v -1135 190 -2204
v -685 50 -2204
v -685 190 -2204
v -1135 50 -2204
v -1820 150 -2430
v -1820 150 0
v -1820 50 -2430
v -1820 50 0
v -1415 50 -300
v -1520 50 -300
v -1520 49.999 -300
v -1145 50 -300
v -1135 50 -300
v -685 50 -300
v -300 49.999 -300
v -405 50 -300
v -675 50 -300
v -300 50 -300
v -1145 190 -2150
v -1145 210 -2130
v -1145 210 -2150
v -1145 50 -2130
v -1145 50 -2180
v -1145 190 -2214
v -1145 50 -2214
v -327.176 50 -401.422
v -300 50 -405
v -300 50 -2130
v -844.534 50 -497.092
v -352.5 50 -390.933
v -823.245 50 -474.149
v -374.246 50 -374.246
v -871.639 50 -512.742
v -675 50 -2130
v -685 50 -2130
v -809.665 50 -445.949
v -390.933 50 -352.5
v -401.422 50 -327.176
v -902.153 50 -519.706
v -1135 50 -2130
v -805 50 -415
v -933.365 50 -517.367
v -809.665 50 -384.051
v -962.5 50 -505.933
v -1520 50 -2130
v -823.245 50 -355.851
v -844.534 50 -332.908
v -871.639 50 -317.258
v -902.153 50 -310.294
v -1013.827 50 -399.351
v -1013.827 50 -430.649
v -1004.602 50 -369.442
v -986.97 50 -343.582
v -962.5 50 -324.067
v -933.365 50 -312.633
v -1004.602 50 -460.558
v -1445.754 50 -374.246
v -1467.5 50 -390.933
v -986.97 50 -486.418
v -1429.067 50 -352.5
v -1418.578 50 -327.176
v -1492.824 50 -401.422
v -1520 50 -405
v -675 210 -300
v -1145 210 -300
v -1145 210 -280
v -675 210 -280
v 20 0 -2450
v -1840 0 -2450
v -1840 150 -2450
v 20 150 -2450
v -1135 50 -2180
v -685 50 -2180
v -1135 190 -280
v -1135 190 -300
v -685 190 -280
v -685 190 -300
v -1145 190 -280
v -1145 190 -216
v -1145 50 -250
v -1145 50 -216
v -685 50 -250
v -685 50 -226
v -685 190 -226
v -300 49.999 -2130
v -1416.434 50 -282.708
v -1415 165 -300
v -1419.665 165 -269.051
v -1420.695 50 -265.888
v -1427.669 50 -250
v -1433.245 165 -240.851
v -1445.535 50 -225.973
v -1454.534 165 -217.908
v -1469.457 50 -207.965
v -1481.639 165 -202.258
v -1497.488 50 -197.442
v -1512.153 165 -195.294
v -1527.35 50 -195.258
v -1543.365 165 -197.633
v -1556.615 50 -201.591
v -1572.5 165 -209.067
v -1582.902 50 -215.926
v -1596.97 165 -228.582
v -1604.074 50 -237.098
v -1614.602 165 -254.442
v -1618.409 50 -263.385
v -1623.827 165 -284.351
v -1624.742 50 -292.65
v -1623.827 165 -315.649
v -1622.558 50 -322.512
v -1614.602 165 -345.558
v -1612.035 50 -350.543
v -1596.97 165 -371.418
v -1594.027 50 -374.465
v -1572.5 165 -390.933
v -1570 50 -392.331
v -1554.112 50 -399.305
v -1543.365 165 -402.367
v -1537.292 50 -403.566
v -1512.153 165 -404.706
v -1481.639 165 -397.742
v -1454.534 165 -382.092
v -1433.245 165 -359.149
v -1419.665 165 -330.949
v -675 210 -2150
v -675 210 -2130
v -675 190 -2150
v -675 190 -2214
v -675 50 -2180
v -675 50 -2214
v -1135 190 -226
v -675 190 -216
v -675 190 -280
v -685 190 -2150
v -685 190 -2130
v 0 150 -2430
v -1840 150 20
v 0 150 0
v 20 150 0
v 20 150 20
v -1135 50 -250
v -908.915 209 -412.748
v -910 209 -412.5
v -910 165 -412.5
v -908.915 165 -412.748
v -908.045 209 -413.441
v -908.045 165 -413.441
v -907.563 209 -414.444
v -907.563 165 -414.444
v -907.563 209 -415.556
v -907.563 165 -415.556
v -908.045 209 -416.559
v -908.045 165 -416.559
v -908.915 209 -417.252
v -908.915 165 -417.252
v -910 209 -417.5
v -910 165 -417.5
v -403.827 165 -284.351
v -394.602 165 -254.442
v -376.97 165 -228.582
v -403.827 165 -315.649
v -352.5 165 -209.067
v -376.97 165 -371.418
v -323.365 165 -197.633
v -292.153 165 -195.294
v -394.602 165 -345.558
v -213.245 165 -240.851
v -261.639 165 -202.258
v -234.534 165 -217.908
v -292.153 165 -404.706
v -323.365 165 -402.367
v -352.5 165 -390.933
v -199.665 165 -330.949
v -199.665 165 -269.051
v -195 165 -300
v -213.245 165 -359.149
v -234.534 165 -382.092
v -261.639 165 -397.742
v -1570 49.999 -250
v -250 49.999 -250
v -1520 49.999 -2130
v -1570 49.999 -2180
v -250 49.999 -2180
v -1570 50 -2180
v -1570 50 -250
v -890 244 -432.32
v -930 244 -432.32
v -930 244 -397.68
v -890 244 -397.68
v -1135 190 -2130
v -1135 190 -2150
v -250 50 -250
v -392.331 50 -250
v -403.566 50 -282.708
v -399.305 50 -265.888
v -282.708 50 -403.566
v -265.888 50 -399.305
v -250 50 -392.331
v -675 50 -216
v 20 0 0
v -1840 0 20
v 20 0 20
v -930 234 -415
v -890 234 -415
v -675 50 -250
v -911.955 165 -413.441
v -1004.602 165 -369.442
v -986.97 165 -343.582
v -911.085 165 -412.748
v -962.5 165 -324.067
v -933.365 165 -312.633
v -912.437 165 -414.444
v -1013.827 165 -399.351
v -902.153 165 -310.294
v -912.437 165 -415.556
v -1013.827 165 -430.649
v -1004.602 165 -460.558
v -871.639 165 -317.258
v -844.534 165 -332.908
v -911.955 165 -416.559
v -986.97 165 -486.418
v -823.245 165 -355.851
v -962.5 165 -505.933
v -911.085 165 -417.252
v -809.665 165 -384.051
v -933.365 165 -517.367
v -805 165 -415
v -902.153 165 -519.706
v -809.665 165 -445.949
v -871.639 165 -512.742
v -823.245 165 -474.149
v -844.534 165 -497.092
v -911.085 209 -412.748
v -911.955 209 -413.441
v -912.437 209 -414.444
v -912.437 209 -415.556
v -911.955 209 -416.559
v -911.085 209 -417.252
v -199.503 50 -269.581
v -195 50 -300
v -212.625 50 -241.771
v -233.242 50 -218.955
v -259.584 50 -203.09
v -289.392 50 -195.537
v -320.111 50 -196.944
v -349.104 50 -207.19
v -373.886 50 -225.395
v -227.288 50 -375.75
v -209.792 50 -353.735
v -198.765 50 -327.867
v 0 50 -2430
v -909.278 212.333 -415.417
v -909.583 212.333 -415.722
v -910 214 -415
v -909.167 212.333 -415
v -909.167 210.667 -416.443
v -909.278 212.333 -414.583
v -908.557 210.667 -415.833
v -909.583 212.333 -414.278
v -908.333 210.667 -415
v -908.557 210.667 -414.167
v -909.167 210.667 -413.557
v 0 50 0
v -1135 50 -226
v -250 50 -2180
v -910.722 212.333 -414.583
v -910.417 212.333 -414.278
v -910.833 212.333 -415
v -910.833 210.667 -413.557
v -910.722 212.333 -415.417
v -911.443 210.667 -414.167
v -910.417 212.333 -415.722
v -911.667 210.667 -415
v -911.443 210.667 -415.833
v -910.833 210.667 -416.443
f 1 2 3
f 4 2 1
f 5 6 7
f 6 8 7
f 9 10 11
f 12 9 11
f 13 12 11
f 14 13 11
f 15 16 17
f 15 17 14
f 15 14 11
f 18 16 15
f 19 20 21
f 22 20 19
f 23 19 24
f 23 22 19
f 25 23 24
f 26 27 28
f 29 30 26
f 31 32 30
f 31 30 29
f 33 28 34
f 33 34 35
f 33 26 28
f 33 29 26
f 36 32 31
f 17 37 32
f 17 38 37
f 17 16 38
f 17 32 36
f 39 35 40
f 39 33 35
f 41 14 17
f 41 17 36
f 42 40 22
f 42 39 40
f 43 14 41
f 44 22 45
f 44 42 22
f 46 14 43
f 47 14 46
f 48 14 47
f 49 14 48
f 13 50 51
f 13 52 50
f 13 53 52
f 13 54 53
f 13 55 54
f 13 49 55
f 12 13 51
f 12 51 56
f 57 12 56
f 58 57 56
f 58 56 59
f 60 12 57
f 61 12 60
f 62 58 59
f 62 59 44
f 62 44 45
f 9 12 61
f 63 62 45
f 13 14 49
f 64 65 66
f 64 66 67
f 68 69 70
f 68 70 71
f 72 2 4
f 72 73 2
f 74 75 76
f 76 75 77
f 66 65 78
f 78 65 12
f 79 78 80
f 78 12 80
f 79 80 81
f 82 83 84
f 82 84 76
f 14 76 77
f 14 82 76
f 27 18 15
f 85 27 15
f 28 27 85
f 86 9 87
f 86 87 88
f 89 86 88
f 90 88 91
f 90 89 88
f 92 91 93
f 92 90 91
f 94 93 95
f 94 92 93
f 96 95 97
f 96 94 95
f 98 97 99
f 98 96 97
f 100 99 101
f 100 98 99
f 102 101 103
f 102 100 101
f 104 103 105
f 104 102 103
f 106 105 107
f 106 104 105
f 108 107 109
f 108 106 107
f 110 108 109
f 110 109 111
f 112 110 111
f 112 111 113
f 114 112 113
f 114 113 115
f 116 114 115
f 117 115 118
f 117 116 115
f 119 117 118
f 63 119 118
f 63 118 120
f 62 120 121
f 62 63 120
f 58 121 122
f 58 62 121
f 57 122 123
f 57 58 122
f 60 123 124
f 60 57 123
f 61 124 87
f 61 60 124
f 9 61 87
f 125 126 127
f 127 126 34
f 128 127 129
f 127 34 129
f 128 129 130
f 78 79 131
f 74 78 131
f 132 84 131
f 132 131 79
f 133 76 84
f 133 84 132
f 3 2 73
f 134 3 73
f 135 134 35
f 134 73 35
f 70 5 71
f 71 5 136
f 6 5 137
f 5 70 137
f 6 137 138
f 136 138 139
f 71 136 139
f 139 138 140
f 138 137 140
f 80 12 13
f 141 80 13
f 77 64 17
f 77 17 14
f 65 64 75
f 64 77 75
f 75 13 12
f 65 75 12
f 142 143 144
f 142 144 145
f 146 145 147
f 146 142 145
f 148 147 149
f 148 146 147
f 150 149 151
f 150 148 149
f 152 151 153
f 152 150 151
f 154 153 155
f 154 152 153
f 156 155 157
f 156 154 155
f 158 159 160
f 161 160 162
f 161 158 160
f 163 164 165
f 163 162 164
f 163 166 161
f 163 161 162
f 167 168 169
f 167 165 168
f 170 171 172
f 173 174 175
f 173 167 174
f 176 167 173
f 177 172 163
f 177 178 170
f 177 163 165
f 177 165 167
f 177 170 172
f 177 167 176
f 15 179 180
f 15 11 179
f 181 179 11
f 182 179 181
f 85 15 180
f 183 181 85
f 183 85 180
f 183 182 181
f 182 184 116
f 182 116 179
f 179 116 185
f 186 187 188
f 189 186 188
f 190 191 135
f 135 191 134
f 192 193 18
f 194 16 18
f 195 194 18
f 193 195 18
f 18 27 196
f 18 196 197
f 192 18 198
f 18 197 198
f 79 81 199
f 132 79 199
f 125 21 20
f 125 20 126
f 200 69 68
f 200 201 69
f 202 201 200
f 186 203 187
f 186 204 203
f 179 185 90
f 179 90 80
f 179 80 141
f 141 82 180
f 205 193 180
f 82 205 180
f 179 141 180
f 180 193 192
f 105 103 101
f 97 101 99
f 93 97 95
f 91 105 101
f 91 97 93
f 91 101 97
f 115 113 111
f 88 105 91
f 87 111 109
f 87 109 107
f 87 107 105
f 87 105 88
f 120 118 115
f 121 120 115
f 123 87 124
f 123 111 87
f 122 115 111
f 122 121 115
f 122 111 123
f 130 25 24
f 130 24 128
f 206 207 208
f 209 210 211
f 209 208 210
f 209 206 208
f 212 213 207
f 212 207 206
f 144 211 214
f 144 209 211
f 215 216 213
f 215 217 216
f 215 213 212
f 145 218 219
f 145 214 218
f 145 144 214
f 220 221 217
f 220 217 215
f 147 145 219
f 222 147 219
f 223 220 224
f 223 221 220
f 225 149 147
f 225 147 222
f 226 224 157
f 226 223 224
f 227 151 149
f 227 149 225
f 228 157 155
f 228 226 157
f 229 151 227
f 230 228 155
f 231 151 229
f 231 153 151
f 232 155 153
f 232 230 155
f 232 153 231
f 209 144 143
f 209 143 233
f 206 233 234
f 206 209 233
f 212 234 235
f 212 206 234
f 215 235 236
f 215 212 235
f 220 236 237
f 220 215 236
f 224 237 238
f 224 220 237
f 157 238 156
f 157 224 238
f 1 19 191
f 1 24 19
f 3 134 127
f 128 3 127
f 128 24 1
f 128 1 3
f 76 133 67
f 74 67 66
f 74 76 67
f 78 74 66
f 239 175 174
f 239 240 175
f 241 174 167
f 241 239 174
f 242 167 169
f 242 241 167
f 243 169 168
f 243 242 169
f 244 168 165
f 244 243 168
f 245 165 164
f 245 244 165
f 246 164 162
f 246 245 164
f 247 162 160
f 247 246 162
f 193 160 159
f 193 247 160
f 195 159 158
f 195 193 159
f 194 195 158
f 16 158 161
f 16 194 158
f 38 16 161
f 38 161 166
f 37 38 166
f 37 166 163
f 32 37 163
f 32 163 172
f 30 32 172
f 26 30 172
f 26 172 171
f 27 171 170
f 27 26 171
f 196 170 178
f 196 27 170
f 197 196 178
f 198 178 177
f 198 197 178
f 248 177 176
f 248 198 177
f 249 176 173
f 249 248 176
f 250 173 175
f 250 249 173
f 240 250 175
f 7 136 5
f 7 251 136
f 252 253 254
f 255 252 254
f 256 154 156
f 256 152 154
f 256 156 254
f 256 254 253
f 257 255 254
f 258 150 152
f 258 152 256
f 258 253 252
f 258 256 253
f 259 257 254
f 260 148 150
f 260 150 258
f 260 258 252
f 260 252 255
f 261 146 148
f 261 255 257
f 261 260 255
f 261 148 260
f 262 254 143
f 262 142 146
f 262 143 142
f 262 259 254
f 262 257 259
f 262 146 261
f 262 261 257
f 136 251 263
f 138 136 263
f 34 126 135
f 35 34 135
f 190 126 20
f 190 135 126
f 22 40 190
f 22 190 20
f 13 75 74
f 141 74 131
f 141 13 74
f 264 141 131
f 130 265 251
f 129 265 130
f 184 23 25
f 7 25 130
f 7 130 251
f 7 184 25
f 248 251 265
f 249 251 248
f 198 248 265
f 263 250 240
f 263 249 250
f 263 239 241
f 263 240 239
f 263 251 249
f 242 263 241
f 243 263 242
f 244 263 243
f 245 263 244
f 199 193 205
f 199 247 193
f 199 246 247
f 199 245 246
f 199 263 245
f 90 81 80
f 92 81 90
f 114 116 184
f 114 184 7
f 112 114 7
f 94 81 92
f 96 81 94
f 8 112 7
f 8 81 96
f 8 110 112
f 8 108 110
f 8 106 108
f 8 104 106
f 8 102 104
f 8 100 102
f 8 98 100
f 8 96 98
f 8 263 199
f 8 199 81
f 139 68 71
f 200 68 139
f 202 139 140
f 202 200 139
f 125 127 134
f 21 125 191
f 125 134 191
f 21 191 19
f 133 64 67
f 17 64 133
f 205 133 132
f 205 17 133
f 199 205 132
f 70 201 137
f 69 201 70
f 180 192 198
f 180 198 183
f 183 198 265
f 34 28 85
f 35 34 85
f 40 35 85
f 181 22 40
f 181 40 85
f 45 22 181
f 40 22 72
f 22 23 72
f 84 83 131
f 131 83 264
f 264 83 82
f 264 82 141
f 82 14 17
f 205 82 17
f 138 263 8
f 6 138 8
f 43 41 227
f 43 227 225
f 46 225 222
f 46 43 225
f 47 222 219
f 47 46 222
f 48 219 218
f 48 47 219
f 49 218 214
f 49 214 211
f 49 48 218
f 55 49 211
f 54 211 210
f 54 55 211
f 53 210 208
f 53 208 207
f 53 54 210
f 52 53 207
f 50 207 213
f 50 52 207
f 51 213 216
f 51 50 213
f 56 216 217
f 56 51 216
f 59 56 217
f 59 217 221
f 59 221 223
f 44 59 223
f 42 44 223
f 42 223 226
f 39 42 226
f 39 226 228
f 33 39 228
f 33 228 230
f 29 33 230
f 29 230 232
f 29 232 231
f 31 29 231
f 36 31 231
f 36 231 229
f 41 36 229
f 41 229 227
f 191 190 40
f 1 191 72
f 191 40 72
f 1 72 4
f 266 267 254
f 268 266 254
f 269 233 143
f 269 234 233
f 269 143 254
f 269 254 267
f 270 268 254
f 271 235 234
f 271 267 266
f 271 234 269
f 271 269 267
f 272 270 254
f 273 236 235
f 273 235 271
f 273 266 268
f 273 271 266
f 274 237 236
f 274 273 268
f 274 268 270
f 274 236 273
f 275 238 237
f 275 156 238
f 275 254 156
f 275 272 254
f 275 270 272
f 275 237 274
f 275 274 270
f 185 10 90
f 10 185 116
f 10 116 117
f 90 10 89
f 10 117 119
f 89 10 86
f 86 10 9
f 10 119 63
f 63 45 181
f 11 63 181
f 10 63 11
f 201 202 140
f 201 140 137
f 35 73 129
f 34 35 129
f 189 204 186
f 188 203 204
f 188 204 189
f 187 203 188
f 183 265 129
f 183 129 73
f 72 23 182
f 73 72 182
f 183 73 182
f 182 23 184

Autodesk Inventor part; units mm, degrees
ref_plane "YZ Plane" through (0, 0, 0) normal (1, 0, 0) x (0, 1, 0)
ref_plane "XZ Plane" through (0, 0, 0) normal (0, 1, 0) x (-1, 0, 0)
ref_plane "XY Plane" through (0, 0, 0) normal (0, 0, 1) x (1, 0, 0)
sketch "Sketch1" plane through (0, 0, 0) normal (0, 1, 0) x (-1, 0, 0)
  line L0 (0, 0) -> (1820, 0)
  line L1 (1820, 0) -> (1820, -2430)
  line L2 (1820, -2430) -> (0, -2430)
  line L3 (0, -2430) -> (0, 0)
  dimension "d0" = 1820
  dimension "d1" = 2430
extrude "Extrusion1" add sketch "Sketch1" along normal blind 50
sketch "Sketch2" plane through (0, 50, 0) normal (0, 1, 0) x (1, 0, 0)
  line L0 (-1820, 2430) -> (-1820, 0) projected
  line L1 (-1820, 0) -> (-1820, 250)
  line L2 (-1820, 250) -> (-1570, 250)
  line L3 (-1820, 250) -> (-1570, 250) construction
  line L4 (0, 2430) -> (-1820, 2430) projected
  line L5 (0, 2430) -> (0, 2180)
  line L6 (0, 0) -> (0, 2430) projected
  line L7 (0, 2180) -> (-250, 2180)
  line L8 (-1570, 250) -> (-250, 250)
  line L9 (-250, 250) -> (-250, 2180)
  line L10 (-250, 2180) -> (-1570, 2180)
  line L11 (-1570, 2180) -> (-1570, 250)
  line L12 (-1570, 250) -> (-1570, 300)
  line L13 (-1570, 300) -> (-1520, 300)
  line L14 (-250, 2180) -> (-300, 2180)
  line L15 (-300, 2180) -> (-300, 2130)
  line L16 (-1520, 300) -> (-300, 300)
  line L17 (-300, 300) -> (-300, 2130)
  line L18 (-300, 2130) -> (-1520, 2130)
  line L19 (-1520, 2130) -> (-1520, 300)
  dimension "d4" = 250
  dimension "d5" = 250
  dimension "d6" = 0
  dimension "d7" = 250
  dimension "d8" = 250
  dimension "d9" = 50
  dimension "d10" = 50
  dimension "d11" = 50
  dimension "d12" = 50
extrude "Extrusion2" cut sketch "Sketch2" against normal blind 0.001 contours L11 L13 L16 L17 L15 L10 L9 L8 | L11 L10 L15 L18 L19 L13
sketch "Sketch3" plane through (0, 0, 0) normal (0, -1, 0) x (1, 0, 0)
  line L0 (0, -2430) -> (-1820, -2430) projected
  line L1 (0, 0) -> (-1820, 0)
  line L2 (-1820, 0) -> (-1820, -2430)
  line L3 (-1820, -2430) -> (0, -2430)
  line L4 (0, -2430) -> (0, 0)
  line L5 (0, 0) -> (20, 0)
  line L6 (20, 0) -> (20, 20)
  line L7 (20, 20) -> (-1840, 20)
  line L8 (-1840, 20) -> (-1840, -2450)
  line L9 (-1840, -2450) -> (20, -2450)
  line L10 (20, -2450) -> (20, 20)
  dimension "d15" = 20
  dimension "d16" = 20
  dimension "d17" = 1860
  dimension "d18" = 2470
extrude "Extrusion3" add sketch "Sketch3" against normal blind 150
sketch "Sketch4" plane through (0, 50, 0) normal (0, 1, 0) x (1, 0, 0)
  line L0 (-300, 300) -> (-300, 2130) projected
  line L1 (-300, 1215) -> (-910, 1215)
  line L2 (-300, 2130) -> (-1520, 2130) projected
  line L3 (-910, 1215) -> (-910, 2130)
  line L4 (-1570, 2180) -> (-250, 2180) projected
  line L5 (-910, 2130) -> (-1135, 2130)
  line L6 (-1135, 2130) -> (-1135, 2204)
  line L7 (-1135, 2130) -> (-1145, 2130)
  line L8 (-1145, 2130) -> (-1145, 2214)
  line L9 (-1145, 2214) -> (-1135, 2214)
  line L10 (-1135, 2214) -> (-1135, 2130)
  line L11 (-1135, 2214) -> (-675, 2214)
  line L12 (-675, 2214) -> (-675, 2204)
  line L13 (-675, 2204) -> (-1135, 2204)
  line L14 (-1135, 2204) -> (-1135, 2214)
  line L15 (-675, 2204) -> (-685, 2204)
  line L16 (-685, 2204) -> (-685, 2130)
  line L17 (-685, 2130) -> (-675, 2130)
  line L18 (-675, 2130) -> (-675, 2204)
  line L19 (-300, 300) -> (-1520, 300)
  line L20 (-1135, 300) -> (-1135, 226)
  line L21 (-1135, 300) -> (-1145, 300)
  line L22 (-1145, 300) -> (-1145, 216)
  line L23 (-1145, 216) -> (-1135, 216)
  line L24 (-1135, 216) -> (-675, 216)
  line L25 (-675, 216) -> (-675, 226)
  line L26 (-675, 226) -> (-1135, 226)
  line L27 (-685, 226) -> (-685, 300)
  line L28 (-685, 300) -> (-675, 300)
  line L29 (-675, 300) -> (-675, 226)
  line L30 (-1145, 216) -> (-675, 216)
  line L31 (-675, 216) -> (-675, 226)
  line L32 (-675, 226) -> (-1145, 226)
  line L33 (-1145, 226) -> (-1145, 216)
  line L34 (-675, 226) -> (-685, 226)
  line L35 (-685, 226) -> (-685, 300)
  line L36 (-685, 300) -> (-675, 300)
  line L37 (-675, 300) -> (-675, 226)
  line L38 (-1145, 226) -> (-1135, 226)
  line L39 (-1135, 226) -> (-1135, 300)
  line L40 (-1135, 300) -> (-1145, 300)
  line L41 (-1145, 300) -> (-1145, 226)
  point P0 (0, 0)
  dimension "d22" = 225
  dimension "d23" = 74
  dimension "d24" = 10
  dimension "d25" = 84
  dimension "d26" = 460
  dimension "d27" = 10
extrude "Extrusion4" add sketch "Sketch4" along normal blind 140 contours L29 L26 L27 L19 | L25 L24 L23 L22 L32 L26 | L2 L16 L4 L18 | L20 L32 L22 L19 | L4 L16 L13 L18 | L2 L8 L4 L6 | L13 L10 L11 L12 | L4 L8 L9 L10 L6
sketch "Sketch5" plane through (0, 190, 0) normal (0, 1, 0) x (1, 0, 0)
  line L0 (-1145, 300) -> (-1145, 250) projected
  line L1 (-675, 250) -> (-675, 300) projected
  line L2 (-1145, 300) -> (-675, 300)
  line L3 (-675, 300) -> (-675, 280)
  line L4 (-675, 280) -> (-1145, 280)
  line L5 (-1145, 280) -> (-1145, 300)
  line L6 (-300, 2130) -> (-1520, 2130) projected
  line L7 (-675, 2130) -> (-675, 2180) projected
  line L8 (-1145, 2130) -> (-675, 2130)
  line L9 (-675, 2130) -> (-675, 2150)
  line L10 (-675, 2150) -> (-1145, 2150)
  line L11 (-1145, 2150) -> (-1145, 2130)
  line L12 (-1145, 2180) -> (-1145, 2130) projected
  line L13 (-1145, 2130) -> (-675, 2130)
  line L14 (-675, 2130) -> (-675, 2130.001)
  line L15 (-675, 2130.001) -> (-1145, 2130.001)
  line L16 (-1145, 2130.001) -> (-1145, 2130)
  line L17 (-1135, 300) -> (-1145, 300) projected
  line L18 (-675, 216) -> (-675, 300) projected
  line L19 (-1145, 300) -> (-675, 300)
  line L20 (-675, 300) -> (-675, 299.999)
  line L21 (-675, 299.999) -> (-1145, 299.999)
  line L22 (-1145, 299.999) -> (-1145, 300)
  point P0 (0, 0)
  dimension "d30" = 20
  dimension "d31" = 20
  dimension "d34" = 0.001
  dimension "d35" = 0.001
extrude "Extrusion5" add sketch "Sketch5" along normal blind 20
sketch "Sketch6" plane through (0, 50, 0) normal (0, 1, 0) x (1, 0, 0)
  line L0 (-1520, 300) -> (-1145, 300) projected
  circle A0 centre (-1520, 300) radius 105
  line L1 (-1135, 300) -> (-685, 300) projected
  line L2 (-910, 300) -> (-910, 415)
  circle A1 centre (-910, 415) radius 105
  line L3 (-300, 300) -> (-300, 2130) projected
  circle A2 centre (-300, 300) radius 105
  point P0 (0, 0)
  dimension "d36" = 210
  dimension "d37" = 115
  dimension "d38" = 210
  dimension "d39" = 210
extrude "Extrusion6" add sketch "Sketch6" along normal blind 115
sketch "Sketch7" plane through (-1520, 165, -300) normal (0, 1, 0) x (1, 0, 0)
  circle A0 centre (610, 115) radius 105 projected
  line L0 (610, 115) -> (590, 115)
  line L1 (590, 115) -> (590, 136.6505)
  line L2 (590, 136.6505) -> (630, 136.6505)
  line L3 (630, 136.6505) -> (630, 93.3495)
  line L4 (630, 93.3495) -> (590, 93.3495)
  line L5 (590, 93.3495) -> (590, 115)
  point P0 (1520, -300)
  dimension "d42" = 20
  dimension "d43" = 21.6505
  dimension "d44" = 40
  dimension "d45" = 43.301
extrude "Extrusion7" add sketch "Sketch7" along normal blind 81.5 contours L1 L2 L3 L4 L5
sketch "Sketch8" plane through (-890, 165, -393.3495) normal (1, 0, 0) x (0, 0, -1)
  line L0 (43.301, 81.5) -> (0, 81.5) projected
  line L1 (21.6505, 81.5) -> (21.6505, 69)
  line L2 (21.6505, 69) -> (43.301, 81.5)
  line L3 (21.6505, 69) -> (0, 81.5)
  line L4 (0, 81.5) -> (0, 0)
  line L5 (126.6505, 0) -> (-83.3495, 0) projected
  line L6 (43.301, 0) -> (43.301, 81.5) projected
  line L7 (0, 0) -> (43.301, 0)
  line L8 (43.301, 0) -> (43.301, 81.5)
  point P0 (-393.3495, -165)
  dimension "d48" = 12.5
extrude "Extrusion8" cut sketch "Sketch8" against normal blind 40 contours L6 L5 L4 L3 L2
sketch "Sketch9" plane through (-910, 165, -415) normal (0, 1, 0) x (1, 0, 0)
  circle A0 centre (0, 0) radius 2.5
  point P0 (910, -415)
  dimension "d51" = 5
extrude "Extrusion9" add sketch "Sketch9" along normal blind 49
sketch "Sketch10" plane through (-910, 214, -415) normal (0, 1, 0) x (1, 0, 0)
  line L0 (20, 0) -> (-20, 0) projected
  line L1 (0, 0) -> (2.9883, 0)
  line L2 (2.9883, 0) -> (2.9883, -4.9362)
  line L3 (2.9883, -4.9362) -> (0, -4.9362)
  line L4 (0, -4.9362) -> (0, 0)
  line L5 (0, 0) -> (4.3041, 0)
  line L6 (4.3041, 0) -> (4.3041, 5.8291)
  line L7 (4.3041, 5.8291) -> (0, 5.8291)
  line L8 (0, 5.8291) -> (0, 0)
  point P0 (910, -415)
extrude "Extrusion10" cut sketch "Sketch10" against normal blind 49
sketch "Sketch11" plane through (-910, 214, -412.5) normal (1, 0, 0) x (0, 0, -1)
  line L0 (5, 0) -> (0, 0) projected
  line L1 (2.5, 0) -> (2.5, -5)
  line L2 (2.5, -5) -> (5, -5)
  line L3 (5, 0) -> (5, -49) projected
  line L4 (2.5, 0) -> (5, -5)
  line L5 (2.5, -5) -> (0, -5)
  line L6 (0, -49) -> (0, 0) projected
  line L7 (0, -5) -> (2.5, 0)
  line L8 (2.5, 0) -> (0, 0)
  line L9 (0, 0) -> (0, -5)
  line L10 (2.5, 0) -> (5, 0)
  line L11 (5, 0) -> (5, -5)
  point P0 (-412.5, -214)
  dimension "d56" = 5
extrude "Extrusion11" cut sketch "Sketch11" against normal blind 49 contours L3 L4 L0 | L7 L6 L0
sketch "Sketch12" plane through (-910, 165, -412.5) normal (1, 0, 0) x (0, 0, -1)
  line L0 (0, 0) -> (0, 44) projected
  line L1 (5, 44) -> (2.5, 49) projected
  line L2 (0, 44) -> (2.5, 49)
  line L3 (2.5, 49) -> (0, 49)
  line L4 (0, 49) -> (0, 44)
  line L5 (2.5, 49) -> (2.5, 44)
  point P0 (-412.5, -165)
revolve "Revolution1" cut sketch "Sketch12" angle 360 about axis through (-910, 214, -415) along (0, -1, 0)
sketch "Sketch13" plane through (-910, 165, -412.5) normal (1, 0, 0) x (0, 0, -1)
  line L0 (2.5, 49) -> (0, 44) projected
  line L1 (2.5, 49) -> (2.5, 0)
  line L2 (0, 0) -> (5, 0) projected
  line L3 (0, 0) -> (2.5, 0)
  line L4 (0, 0) -> (0, 44) projected
  line L5 (0, 0) -> (0, 44)
  line L6 (0, 44) -> (2.5, 49)
  point P0 (-412.5, -165)
revolve "Revolution2" add sketch "Sketch13" angle 360 about axis through (-910, 214, -415) along (0, -1, 0)
sketch "Sketch14" plane through (-930, 246.5, -436.6505) normal (-1, 0, 0) x (0, 0, 1)
  line L0 (21.6505, -12.5) -> (0, 0) projected
  line L1 (21.6505, -12.5) -> (4.33, -2.5)
  line L2 (4.33, -2.5) -> (41.9636, -2.5)
  line L3 (41.9636, -2.5) -> (49.2535, 5.0319)
  line L4 (49.2535, 5.0319) -> (0, 9.6321)
  line L5 (0, 9.6321) -> (-10.8326, 2.9723)
  line L6 (-10.8326, 2.9723) -> (-0.2689, -2.0704)
  line L7 (-0.2689, -2.0704) -> (4.33, -2.5)
  point P0 (436.6505, -246.5)
  dimension "d61" = 20
extrude "Extrusion12" cut sketch "Sketch14" against normal blind 40
properties part number "Simulation"
